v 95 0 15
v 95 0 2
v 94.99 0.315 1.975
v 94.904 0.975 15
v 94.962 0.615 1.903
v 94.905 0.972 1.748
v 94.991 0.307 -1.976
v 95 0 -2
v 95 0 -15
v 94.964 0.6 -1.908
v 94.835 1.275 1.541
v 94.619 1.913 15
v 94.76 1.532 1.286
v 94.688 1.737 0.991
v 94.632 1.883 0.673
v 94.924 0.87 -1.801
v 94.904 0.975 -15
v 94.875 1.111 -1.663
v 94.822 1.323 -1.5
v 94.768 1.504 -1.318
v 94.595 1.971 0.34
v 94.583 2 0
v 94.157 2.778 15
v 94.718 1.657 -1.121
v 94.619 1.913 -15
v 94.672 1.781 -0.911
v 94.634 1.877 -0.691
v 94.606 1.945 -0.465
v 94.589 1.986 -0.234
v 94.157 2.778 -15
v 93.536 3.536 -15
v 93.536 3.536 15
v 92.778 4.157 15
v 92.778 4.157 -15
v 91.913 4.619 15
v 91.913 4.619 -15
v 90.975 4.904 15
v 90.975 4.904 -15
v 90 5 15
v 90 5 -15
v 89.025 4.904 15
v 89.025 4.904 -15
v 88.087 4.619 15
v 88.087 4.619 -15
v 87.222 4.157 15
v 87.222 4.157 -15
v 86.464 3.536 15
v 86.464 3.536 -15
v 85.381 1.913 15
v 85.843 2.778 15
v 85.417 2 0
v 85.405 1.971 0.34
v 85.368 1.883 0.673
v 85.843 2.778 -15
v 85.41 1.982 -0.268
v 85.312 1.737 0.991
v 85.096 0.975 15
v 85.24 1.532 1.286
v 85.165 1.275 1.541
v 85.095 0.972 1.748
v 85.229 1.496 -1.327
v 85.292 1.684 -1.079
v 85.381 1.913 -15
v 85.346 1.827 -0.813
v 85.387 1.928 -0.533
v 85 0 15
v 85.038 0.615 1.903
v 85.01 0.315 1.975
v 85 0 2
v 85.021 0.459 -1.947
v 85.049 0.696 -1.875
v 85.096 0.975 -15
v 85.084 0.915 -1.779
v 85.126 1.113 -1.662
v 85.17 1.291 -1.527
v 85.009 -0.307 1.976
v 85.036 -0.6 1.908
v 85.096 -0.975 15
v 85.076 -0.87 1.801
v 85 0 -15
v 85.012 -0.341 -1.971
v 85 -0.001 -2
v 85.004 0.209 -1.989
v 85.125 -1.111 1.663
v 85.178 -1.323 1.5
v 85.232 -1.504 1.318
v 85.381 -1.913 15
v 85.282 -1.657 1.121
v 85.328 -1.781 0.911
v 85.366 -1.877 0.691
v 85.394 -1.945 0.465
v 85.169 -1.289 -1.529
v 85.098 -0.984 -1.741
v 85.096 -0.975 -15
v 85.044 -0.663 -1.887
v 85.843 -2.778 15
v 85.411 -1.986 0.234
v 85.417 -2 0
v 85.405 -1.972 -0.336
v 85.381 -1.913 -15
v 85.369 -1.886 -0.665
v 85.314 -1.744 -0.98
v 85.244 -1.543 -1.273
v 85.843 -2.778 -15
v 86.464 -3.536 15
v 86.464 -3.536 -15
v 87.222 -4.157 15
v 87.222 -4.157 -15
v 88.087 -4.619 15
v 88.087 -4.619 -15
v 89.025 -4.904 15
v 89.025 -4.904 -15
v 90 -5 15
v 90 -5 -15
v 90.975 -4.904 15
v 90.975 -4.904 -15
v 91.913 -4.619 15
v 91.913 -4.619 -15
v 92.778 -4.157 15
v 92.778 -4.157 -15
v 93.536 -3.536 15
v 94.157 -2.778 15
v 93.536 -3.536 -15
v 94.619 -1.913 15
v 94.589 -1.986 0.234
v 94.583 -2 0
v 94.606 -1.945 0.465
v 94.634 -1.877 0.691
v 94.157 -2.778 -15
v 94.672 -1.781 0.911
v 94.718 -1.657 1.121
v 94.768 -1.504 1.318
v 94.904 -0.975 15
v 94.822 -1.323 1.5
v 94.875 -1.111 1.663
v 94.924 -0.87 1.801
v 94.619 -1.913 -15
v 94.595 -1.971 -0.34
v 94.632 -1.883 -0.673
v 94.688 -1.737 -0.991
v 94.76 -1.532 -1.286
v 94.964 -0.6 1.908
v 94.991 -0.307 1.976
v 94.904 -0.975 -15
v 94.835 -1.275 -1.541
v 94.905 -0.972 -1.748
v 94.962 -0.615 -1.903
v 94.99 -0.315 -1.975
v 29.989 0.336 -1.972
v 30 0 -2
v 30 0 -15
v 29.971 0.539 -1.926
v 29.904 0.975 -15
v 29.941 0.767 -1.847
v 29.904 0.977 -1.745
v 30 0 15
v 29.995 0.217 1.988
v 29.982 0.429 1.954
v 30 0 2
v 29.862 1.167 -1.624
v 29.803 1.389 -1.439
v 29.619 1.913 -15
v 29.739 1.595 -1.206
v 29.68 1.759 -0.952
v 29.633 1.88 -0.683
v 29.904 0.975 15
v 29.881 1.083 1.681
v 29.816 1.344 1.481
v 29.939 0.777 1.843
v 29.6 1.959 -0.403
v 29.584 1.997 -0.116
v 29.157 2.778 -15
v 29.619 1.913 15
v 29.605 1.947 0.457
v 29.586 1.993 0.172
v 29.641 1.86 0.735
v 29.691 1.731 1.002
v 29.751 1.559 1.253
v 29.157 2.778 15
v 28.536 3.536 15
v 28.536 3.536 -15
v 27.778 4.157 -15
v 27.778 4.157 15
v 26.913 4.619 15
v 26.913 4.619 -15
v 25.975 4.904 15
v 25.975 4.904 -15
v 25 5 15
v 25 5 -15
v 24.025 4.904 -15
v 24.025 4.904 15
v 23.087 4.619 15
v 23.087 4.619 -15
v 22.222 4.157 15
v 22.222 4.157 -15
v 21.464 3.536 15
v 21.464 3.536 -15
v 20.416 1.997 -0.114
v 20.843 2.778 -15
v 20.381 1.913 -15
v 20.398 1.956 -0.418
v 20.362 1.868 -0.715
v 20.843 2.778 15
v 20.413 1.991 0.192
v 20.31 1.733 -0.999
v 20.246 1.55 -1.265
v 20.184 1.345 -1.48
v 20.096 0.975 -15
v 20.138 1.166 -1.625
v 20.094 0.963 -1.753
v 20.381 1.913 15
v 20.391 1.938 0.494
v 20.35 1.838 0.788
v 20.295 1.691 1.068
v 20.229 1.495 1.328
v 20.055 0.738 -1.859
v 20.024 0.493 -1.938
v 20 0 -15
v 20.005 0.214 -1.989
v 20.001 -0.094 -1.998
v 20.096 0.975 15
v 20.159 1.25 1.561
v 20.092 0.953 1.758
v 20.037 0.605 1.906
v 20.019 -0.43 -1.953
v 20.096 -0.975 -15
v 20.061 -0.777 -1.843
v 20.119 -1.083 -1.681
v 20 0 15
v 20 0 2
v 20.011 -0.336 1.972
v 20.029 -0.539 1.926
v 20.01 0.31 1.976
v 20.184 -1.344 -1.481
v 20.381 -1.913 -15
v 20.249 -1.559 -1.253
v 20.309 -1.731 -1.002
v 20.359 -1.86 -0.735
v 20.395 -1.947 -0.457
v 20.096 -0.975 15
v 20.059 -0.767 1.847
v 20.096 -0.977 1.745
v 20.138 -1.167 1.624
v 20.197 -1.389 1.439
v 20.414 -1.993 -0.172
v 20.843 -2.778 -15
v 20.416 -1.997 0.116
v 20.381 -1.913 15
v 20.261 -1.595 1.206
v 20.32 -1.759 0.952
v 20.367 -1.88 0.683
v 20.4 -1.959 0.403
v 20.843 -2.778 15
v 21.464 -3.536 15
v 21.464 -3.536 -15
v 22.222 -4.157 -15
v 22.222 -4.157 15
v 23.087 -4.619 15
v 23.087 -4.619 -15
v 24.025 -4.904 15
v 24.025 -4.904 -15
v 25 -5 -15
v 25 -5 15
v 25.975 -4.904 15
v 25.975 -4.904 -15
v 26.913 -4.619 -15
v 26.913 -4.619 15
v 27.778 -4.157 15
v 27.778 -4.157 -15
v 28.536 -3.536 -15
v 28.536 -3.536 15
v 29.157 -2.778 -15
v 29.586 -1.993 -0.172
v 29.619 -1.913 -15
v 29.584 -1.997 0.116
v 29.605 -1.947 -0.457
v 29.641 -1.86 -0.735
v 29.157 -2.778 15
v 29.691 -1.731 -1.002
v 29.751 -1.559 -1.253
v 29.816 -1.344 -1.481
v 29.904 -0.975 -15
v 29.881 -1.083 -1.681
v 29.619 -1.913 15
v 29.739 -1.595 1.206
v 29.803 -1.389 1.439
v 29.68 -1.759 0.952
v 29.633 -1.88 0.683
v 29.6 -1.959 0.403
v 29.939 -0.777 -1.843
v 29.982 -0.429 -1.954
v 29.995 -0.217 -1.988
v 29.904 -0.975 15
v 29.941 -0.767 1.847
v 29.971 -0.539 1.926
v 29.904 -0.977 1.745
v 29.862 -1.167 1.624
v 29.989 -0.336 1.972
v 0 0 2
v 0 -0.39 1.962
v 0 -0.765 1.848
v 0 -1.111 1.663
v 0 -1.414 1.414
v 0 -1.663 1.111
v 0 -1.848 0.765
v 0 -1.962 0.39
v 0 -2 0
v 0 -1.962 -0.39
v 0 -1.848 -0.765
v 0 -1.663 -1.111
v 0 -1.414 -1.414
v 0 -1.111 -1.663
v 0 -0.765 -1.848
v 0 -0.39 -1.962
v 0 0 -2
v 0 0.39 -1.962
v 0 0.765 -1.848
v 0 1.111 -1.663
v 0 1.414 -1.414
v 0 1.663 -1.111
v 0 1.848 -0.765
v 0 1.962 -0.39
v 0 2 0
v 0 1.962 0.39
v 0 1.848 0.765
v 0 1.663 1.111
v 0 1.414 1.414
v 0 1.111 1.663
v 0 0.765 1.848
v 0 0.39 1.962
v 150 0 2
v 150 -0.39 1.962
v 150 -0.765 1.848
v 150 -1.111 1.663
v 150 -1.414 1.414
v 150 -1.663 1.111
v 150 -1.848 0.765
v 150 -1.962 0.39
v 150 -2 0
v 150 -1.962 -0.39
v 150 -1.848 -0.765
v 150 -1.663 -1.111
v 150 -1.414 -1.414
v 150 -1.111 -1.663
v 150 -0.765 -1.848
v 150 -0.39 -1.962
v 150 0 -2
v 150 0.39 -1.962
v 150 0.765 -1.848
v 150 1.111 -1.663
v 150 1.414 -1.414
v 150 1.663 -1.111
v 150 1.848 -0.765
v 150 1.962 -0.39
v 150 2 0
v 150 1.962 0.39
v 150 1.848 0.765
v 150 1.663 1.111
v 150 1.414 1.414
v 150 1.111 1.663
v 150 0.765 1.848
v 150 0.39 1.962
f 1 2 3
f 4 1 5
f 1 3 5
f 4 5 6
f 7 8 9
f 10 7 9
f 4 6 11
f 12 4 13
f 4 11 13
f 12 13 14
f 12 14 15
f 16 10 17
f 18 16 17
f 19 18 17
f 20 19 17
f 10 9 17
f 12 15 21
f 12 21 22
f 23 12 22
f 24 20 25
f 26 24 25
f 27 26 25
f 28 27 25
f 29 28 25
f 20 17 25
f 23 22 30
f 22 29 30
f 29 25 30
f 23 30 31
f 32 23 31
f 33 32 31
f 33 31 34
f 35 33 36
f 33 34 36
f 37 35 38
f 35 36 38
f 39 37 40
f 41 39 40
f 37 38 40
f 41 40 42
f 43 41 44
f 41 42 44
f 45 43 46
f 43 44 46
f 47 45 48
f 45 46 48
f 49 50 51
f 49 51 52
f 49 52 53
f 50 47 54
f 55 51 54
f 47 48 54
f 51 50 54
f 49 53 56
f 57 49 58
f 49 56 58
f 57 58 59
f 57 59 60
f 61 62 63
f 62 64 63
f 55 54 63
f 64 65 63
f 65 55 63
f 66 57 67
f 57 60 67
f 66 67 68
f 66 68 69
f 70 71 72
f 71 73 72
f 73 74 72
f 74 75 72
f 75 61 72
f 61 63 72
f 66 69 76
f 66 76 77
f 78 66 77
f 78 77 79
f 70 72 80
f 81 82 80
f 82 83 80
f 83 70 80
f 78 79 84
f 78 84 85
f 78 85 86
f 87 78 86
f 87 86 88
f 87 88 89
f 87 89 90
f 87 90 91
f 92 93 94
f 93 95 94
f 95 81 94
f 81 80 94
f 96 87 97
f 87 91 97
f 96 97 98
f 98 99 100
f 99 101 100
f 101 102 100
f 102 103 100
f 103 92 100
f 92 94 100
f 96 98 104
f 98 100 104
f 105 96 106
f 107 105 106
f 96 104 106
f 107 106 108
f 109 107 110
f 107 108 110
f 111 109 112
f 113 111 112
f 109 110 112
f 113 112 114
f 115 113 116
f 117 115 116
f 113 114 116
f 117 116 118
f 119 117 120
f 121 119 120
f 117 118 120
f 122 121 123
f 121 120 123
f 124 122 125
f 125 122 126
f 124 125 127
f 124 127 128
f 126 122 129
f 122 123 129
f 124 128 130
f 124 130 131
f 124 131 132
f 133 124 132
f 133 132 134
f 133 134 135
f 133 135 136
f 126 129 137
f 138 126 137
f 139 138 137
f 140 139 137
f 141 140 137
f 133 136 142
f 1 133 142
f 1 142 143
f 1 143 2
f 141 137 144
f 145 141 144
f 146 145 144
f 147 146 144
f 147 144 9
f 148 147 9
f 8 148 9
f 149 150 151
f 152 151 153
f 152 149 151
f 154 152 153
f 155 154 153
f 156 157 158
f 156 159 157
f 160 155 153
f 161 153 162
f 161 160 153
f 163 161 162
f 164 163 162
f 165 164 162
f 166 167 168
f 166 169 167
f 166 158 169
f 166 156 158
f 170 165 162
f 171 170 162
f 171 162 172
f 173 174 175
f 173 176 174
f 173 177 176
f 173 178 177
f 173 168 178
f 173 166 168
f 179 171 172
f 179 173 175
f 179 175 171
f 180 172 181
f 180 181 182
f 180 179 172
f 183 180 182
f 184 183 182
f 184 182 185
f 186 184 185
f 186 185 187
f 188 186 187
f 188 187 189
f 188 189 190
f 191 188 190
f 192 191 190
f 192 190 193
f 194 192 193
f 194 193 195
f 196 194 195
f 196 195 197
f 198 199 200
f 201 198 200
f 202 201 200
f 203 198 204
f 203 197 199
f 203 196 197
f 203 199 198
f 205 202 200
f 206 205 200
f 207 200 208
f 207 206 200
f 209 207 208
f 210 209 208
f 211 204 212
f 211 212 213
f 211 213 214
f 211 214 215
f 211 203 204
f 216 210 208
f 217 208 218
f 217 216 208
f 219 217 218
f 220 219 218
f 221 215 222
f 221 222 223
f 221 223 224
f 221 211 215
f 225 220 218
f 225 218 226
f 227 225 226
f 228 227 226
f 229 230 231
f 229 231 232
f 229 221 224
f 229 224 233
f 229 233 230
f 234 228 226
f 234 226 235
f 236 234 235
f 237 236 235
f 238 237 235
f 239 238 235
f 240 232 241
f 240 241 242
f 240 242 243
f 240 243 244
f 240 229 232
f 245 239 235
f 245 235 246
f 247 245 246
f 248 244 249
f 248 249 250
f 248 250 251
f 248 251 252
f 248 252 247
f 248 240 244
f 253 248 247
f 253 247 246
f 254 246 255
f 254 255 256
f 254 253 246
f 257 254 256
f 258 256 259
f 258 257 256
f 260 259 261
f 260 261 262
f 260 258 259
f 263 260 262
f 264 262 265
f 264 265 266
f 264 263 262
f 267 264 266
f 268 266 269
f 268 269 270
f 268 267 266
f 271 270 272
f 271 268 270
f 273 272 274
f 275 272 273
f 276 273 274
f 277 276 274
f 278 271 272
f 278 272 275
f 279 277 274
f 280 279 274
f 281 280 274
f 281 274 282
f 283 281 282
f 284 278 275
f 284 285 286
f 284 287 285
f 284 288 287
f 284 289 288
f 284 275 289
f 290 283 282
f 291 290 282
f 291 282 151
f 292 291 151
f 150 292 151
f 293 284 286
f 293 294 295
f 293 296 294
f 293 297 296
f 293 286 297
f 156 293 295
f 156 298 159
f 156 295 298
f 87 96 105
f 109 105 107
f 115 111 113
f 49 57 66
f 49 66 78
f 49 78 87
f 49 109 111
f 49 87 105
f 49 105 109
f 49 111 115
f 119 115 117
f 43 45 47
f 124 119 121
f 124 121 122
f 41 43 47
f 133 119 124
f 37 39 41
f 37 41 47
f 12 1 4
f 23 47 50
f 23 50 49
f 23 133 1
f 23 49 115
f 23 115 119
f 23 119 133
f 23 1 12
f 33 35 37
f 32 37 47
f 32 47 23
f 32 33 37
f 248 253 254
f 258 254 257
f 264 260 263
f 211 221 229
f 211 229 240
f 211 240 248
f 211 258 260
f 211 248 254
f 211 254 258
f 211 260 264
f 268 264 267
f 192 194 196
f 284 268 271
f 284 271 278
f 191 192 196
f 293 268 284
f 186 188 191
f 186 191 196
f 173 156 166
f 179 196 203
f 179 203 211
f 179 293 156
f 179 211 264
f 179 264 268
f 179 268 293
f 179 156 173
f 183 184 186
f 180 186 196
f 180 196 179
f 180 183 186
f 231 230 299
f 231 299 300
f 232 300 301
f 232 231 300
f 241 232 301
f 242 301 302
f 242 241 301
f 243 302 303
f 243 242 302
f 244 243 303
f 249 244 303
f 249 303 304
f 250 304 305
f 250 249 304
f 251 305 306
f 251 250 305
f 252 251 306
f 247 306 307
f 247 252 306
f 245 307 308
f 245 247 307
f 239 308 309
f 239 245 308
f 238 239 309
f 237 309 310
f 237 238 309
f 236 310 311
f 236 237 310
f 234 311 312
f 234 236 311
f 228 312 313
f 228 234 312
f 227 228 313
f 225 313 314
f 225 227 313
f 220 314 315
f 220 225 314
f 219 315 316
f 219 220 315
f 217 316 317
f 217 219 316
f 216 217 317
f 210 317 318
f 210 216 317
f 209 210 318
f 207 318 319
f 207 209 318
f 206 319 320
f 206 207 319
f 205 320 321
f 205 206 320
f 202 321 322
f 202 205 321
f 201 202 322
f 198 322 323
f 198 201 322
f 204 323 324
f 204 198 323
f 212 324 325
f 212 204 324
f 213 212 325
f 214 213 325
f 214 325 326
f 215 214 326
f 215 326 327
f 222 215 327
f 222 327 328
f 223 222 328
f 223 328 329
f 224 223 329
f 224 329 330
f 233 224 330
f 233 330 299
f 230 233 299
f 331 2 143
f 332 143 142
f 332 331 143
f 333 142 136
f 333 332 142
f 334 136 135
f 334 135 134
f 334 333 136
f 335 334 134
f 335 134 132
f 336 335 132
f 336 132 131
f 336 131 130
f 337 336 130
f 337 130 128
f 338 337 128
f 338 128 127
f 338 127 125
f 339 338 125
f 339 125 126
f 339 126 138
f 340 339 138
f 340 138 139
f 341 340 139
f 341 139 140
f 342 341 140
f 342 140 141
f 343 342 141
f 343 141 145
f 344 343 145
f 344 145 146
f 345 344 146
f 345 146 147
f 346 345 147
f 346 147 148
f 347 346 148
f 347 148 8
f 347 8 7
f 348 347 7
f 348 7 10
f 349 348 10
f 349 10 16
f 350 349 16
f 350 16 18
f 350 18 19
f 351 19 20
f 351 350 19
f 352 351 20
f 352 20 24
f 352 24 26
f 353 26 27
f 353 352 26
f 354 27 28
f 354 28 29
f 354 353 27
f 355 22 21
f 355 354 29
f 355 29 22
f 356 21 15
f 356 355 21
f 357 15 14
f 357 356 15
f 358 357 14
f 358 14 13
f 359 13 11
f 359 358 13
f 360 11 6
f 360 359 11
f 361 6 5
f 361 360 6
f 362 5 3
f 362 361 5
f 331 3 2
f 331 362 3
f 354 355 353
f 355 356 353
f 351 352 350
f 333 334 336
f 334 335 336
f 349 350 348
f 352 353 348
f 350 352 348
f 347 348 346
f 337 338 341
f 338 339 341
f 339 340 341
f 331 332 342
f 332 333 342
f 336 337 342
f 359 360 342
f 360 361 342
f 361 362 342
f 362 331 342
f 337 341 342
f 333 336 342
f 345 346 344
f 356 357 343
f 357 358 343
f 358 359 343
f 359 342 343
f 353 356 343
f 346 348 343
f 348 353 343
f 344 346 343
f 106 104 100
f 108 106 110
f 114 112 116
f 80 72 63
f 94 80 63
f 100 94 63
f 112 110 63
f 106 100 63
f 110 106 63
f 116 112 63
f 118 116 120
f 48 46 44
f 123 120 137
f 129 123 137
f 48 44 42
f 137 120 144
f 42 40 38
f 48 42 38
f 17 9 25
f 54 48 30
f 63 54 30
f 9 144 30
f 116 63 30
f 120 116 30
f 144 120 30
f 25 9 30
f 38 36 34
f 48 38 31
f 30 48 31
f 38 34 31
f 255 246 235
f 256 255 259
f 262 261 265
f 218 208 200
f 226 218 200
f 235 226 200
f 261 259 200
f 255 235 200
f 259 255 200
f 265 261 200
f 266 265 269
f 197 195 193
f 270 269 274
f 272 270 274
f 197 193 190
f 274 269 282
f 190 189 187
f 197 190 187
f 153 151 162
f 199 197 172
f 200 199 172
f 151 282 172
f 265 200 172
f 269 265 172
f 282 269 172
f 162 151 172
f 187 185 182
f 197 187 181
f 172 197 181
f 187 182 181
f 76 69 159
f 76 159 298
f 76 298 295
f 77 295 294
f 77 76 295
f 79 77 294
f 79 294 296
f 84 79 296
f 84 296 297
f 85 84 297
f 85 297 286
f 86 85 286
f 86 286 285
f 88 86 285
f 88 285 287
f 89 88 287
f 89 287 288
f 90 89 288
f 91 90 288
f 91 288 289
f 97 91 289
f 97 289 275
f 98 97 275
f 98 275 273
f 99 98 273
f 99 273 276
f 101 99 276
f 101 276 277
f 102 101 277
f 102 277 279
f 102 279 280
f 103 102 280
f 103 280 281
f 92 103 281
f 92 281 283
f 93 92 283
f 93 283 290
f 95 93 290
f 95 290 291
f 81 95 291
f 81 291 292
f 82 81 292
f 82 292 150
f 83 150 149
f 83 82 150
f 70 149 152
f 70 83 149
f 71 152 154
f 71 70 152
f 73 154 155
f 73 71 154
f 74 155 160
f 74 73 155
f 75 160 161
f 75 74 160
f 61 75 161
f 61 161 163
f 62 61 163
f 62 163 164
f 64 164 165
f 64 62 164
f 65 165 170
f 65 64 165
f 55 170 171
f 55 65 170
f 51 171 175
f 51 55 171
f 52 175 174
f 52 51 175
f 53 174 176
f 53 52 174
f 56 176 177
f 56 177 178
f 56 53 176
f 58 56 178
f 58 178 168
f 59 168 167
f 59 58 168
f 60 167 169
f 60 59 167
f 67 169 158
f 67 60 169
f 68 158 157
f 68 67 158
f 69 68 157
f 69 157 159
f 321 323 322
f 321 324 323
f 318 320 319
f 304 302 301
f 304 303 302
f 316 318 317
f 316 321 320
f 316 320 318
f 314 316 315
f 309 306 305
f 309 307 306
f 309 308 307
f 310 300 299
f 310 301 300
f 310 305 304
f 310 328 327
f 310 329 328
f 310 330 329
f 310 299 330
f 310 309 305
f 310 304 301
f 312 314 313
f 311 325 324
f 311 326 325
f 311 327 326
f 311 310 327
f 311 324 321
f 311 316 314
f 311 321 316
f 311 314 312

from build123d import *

# Parameters (mm, degrees)
ESQUISSE1_W      = 150
ESQUISSE1_H      = 2
ESQUISSE2_R      = 5
EXTRUSION1_DEPTH = 15


with BuildPart() as part:
    # Esquisse1 → Révolution1 (revolve)
    with BuildSketch(Plane.XY, mode=Mode.PRIVATE) as r_volution1_sk:
        with Locations((75, 1)):
            Rectangle(ESQUISSE1_W, ESQUISSE1_H)
    revolve(r_volution1_sk.sketch.rotate(Axis((0, 0, 0), (1, 0, 0)), 90), axis=Axis((0, 0, 0), (1, 0, 0)))  # turned: the seam where the file's is

    # Esquisse2 → Extrusion1 (add, symmetric)
    with BuildSketch(Plane.XY):
        with Locations((90, 0)):
            Circle(ESQUISSE2_R)
        with Locations((25, 0)):
            Circle(ESQUISSE2_R)
    extrude(amount=EXTRUSION1_DEPTH, both=True)


solid = part.part
